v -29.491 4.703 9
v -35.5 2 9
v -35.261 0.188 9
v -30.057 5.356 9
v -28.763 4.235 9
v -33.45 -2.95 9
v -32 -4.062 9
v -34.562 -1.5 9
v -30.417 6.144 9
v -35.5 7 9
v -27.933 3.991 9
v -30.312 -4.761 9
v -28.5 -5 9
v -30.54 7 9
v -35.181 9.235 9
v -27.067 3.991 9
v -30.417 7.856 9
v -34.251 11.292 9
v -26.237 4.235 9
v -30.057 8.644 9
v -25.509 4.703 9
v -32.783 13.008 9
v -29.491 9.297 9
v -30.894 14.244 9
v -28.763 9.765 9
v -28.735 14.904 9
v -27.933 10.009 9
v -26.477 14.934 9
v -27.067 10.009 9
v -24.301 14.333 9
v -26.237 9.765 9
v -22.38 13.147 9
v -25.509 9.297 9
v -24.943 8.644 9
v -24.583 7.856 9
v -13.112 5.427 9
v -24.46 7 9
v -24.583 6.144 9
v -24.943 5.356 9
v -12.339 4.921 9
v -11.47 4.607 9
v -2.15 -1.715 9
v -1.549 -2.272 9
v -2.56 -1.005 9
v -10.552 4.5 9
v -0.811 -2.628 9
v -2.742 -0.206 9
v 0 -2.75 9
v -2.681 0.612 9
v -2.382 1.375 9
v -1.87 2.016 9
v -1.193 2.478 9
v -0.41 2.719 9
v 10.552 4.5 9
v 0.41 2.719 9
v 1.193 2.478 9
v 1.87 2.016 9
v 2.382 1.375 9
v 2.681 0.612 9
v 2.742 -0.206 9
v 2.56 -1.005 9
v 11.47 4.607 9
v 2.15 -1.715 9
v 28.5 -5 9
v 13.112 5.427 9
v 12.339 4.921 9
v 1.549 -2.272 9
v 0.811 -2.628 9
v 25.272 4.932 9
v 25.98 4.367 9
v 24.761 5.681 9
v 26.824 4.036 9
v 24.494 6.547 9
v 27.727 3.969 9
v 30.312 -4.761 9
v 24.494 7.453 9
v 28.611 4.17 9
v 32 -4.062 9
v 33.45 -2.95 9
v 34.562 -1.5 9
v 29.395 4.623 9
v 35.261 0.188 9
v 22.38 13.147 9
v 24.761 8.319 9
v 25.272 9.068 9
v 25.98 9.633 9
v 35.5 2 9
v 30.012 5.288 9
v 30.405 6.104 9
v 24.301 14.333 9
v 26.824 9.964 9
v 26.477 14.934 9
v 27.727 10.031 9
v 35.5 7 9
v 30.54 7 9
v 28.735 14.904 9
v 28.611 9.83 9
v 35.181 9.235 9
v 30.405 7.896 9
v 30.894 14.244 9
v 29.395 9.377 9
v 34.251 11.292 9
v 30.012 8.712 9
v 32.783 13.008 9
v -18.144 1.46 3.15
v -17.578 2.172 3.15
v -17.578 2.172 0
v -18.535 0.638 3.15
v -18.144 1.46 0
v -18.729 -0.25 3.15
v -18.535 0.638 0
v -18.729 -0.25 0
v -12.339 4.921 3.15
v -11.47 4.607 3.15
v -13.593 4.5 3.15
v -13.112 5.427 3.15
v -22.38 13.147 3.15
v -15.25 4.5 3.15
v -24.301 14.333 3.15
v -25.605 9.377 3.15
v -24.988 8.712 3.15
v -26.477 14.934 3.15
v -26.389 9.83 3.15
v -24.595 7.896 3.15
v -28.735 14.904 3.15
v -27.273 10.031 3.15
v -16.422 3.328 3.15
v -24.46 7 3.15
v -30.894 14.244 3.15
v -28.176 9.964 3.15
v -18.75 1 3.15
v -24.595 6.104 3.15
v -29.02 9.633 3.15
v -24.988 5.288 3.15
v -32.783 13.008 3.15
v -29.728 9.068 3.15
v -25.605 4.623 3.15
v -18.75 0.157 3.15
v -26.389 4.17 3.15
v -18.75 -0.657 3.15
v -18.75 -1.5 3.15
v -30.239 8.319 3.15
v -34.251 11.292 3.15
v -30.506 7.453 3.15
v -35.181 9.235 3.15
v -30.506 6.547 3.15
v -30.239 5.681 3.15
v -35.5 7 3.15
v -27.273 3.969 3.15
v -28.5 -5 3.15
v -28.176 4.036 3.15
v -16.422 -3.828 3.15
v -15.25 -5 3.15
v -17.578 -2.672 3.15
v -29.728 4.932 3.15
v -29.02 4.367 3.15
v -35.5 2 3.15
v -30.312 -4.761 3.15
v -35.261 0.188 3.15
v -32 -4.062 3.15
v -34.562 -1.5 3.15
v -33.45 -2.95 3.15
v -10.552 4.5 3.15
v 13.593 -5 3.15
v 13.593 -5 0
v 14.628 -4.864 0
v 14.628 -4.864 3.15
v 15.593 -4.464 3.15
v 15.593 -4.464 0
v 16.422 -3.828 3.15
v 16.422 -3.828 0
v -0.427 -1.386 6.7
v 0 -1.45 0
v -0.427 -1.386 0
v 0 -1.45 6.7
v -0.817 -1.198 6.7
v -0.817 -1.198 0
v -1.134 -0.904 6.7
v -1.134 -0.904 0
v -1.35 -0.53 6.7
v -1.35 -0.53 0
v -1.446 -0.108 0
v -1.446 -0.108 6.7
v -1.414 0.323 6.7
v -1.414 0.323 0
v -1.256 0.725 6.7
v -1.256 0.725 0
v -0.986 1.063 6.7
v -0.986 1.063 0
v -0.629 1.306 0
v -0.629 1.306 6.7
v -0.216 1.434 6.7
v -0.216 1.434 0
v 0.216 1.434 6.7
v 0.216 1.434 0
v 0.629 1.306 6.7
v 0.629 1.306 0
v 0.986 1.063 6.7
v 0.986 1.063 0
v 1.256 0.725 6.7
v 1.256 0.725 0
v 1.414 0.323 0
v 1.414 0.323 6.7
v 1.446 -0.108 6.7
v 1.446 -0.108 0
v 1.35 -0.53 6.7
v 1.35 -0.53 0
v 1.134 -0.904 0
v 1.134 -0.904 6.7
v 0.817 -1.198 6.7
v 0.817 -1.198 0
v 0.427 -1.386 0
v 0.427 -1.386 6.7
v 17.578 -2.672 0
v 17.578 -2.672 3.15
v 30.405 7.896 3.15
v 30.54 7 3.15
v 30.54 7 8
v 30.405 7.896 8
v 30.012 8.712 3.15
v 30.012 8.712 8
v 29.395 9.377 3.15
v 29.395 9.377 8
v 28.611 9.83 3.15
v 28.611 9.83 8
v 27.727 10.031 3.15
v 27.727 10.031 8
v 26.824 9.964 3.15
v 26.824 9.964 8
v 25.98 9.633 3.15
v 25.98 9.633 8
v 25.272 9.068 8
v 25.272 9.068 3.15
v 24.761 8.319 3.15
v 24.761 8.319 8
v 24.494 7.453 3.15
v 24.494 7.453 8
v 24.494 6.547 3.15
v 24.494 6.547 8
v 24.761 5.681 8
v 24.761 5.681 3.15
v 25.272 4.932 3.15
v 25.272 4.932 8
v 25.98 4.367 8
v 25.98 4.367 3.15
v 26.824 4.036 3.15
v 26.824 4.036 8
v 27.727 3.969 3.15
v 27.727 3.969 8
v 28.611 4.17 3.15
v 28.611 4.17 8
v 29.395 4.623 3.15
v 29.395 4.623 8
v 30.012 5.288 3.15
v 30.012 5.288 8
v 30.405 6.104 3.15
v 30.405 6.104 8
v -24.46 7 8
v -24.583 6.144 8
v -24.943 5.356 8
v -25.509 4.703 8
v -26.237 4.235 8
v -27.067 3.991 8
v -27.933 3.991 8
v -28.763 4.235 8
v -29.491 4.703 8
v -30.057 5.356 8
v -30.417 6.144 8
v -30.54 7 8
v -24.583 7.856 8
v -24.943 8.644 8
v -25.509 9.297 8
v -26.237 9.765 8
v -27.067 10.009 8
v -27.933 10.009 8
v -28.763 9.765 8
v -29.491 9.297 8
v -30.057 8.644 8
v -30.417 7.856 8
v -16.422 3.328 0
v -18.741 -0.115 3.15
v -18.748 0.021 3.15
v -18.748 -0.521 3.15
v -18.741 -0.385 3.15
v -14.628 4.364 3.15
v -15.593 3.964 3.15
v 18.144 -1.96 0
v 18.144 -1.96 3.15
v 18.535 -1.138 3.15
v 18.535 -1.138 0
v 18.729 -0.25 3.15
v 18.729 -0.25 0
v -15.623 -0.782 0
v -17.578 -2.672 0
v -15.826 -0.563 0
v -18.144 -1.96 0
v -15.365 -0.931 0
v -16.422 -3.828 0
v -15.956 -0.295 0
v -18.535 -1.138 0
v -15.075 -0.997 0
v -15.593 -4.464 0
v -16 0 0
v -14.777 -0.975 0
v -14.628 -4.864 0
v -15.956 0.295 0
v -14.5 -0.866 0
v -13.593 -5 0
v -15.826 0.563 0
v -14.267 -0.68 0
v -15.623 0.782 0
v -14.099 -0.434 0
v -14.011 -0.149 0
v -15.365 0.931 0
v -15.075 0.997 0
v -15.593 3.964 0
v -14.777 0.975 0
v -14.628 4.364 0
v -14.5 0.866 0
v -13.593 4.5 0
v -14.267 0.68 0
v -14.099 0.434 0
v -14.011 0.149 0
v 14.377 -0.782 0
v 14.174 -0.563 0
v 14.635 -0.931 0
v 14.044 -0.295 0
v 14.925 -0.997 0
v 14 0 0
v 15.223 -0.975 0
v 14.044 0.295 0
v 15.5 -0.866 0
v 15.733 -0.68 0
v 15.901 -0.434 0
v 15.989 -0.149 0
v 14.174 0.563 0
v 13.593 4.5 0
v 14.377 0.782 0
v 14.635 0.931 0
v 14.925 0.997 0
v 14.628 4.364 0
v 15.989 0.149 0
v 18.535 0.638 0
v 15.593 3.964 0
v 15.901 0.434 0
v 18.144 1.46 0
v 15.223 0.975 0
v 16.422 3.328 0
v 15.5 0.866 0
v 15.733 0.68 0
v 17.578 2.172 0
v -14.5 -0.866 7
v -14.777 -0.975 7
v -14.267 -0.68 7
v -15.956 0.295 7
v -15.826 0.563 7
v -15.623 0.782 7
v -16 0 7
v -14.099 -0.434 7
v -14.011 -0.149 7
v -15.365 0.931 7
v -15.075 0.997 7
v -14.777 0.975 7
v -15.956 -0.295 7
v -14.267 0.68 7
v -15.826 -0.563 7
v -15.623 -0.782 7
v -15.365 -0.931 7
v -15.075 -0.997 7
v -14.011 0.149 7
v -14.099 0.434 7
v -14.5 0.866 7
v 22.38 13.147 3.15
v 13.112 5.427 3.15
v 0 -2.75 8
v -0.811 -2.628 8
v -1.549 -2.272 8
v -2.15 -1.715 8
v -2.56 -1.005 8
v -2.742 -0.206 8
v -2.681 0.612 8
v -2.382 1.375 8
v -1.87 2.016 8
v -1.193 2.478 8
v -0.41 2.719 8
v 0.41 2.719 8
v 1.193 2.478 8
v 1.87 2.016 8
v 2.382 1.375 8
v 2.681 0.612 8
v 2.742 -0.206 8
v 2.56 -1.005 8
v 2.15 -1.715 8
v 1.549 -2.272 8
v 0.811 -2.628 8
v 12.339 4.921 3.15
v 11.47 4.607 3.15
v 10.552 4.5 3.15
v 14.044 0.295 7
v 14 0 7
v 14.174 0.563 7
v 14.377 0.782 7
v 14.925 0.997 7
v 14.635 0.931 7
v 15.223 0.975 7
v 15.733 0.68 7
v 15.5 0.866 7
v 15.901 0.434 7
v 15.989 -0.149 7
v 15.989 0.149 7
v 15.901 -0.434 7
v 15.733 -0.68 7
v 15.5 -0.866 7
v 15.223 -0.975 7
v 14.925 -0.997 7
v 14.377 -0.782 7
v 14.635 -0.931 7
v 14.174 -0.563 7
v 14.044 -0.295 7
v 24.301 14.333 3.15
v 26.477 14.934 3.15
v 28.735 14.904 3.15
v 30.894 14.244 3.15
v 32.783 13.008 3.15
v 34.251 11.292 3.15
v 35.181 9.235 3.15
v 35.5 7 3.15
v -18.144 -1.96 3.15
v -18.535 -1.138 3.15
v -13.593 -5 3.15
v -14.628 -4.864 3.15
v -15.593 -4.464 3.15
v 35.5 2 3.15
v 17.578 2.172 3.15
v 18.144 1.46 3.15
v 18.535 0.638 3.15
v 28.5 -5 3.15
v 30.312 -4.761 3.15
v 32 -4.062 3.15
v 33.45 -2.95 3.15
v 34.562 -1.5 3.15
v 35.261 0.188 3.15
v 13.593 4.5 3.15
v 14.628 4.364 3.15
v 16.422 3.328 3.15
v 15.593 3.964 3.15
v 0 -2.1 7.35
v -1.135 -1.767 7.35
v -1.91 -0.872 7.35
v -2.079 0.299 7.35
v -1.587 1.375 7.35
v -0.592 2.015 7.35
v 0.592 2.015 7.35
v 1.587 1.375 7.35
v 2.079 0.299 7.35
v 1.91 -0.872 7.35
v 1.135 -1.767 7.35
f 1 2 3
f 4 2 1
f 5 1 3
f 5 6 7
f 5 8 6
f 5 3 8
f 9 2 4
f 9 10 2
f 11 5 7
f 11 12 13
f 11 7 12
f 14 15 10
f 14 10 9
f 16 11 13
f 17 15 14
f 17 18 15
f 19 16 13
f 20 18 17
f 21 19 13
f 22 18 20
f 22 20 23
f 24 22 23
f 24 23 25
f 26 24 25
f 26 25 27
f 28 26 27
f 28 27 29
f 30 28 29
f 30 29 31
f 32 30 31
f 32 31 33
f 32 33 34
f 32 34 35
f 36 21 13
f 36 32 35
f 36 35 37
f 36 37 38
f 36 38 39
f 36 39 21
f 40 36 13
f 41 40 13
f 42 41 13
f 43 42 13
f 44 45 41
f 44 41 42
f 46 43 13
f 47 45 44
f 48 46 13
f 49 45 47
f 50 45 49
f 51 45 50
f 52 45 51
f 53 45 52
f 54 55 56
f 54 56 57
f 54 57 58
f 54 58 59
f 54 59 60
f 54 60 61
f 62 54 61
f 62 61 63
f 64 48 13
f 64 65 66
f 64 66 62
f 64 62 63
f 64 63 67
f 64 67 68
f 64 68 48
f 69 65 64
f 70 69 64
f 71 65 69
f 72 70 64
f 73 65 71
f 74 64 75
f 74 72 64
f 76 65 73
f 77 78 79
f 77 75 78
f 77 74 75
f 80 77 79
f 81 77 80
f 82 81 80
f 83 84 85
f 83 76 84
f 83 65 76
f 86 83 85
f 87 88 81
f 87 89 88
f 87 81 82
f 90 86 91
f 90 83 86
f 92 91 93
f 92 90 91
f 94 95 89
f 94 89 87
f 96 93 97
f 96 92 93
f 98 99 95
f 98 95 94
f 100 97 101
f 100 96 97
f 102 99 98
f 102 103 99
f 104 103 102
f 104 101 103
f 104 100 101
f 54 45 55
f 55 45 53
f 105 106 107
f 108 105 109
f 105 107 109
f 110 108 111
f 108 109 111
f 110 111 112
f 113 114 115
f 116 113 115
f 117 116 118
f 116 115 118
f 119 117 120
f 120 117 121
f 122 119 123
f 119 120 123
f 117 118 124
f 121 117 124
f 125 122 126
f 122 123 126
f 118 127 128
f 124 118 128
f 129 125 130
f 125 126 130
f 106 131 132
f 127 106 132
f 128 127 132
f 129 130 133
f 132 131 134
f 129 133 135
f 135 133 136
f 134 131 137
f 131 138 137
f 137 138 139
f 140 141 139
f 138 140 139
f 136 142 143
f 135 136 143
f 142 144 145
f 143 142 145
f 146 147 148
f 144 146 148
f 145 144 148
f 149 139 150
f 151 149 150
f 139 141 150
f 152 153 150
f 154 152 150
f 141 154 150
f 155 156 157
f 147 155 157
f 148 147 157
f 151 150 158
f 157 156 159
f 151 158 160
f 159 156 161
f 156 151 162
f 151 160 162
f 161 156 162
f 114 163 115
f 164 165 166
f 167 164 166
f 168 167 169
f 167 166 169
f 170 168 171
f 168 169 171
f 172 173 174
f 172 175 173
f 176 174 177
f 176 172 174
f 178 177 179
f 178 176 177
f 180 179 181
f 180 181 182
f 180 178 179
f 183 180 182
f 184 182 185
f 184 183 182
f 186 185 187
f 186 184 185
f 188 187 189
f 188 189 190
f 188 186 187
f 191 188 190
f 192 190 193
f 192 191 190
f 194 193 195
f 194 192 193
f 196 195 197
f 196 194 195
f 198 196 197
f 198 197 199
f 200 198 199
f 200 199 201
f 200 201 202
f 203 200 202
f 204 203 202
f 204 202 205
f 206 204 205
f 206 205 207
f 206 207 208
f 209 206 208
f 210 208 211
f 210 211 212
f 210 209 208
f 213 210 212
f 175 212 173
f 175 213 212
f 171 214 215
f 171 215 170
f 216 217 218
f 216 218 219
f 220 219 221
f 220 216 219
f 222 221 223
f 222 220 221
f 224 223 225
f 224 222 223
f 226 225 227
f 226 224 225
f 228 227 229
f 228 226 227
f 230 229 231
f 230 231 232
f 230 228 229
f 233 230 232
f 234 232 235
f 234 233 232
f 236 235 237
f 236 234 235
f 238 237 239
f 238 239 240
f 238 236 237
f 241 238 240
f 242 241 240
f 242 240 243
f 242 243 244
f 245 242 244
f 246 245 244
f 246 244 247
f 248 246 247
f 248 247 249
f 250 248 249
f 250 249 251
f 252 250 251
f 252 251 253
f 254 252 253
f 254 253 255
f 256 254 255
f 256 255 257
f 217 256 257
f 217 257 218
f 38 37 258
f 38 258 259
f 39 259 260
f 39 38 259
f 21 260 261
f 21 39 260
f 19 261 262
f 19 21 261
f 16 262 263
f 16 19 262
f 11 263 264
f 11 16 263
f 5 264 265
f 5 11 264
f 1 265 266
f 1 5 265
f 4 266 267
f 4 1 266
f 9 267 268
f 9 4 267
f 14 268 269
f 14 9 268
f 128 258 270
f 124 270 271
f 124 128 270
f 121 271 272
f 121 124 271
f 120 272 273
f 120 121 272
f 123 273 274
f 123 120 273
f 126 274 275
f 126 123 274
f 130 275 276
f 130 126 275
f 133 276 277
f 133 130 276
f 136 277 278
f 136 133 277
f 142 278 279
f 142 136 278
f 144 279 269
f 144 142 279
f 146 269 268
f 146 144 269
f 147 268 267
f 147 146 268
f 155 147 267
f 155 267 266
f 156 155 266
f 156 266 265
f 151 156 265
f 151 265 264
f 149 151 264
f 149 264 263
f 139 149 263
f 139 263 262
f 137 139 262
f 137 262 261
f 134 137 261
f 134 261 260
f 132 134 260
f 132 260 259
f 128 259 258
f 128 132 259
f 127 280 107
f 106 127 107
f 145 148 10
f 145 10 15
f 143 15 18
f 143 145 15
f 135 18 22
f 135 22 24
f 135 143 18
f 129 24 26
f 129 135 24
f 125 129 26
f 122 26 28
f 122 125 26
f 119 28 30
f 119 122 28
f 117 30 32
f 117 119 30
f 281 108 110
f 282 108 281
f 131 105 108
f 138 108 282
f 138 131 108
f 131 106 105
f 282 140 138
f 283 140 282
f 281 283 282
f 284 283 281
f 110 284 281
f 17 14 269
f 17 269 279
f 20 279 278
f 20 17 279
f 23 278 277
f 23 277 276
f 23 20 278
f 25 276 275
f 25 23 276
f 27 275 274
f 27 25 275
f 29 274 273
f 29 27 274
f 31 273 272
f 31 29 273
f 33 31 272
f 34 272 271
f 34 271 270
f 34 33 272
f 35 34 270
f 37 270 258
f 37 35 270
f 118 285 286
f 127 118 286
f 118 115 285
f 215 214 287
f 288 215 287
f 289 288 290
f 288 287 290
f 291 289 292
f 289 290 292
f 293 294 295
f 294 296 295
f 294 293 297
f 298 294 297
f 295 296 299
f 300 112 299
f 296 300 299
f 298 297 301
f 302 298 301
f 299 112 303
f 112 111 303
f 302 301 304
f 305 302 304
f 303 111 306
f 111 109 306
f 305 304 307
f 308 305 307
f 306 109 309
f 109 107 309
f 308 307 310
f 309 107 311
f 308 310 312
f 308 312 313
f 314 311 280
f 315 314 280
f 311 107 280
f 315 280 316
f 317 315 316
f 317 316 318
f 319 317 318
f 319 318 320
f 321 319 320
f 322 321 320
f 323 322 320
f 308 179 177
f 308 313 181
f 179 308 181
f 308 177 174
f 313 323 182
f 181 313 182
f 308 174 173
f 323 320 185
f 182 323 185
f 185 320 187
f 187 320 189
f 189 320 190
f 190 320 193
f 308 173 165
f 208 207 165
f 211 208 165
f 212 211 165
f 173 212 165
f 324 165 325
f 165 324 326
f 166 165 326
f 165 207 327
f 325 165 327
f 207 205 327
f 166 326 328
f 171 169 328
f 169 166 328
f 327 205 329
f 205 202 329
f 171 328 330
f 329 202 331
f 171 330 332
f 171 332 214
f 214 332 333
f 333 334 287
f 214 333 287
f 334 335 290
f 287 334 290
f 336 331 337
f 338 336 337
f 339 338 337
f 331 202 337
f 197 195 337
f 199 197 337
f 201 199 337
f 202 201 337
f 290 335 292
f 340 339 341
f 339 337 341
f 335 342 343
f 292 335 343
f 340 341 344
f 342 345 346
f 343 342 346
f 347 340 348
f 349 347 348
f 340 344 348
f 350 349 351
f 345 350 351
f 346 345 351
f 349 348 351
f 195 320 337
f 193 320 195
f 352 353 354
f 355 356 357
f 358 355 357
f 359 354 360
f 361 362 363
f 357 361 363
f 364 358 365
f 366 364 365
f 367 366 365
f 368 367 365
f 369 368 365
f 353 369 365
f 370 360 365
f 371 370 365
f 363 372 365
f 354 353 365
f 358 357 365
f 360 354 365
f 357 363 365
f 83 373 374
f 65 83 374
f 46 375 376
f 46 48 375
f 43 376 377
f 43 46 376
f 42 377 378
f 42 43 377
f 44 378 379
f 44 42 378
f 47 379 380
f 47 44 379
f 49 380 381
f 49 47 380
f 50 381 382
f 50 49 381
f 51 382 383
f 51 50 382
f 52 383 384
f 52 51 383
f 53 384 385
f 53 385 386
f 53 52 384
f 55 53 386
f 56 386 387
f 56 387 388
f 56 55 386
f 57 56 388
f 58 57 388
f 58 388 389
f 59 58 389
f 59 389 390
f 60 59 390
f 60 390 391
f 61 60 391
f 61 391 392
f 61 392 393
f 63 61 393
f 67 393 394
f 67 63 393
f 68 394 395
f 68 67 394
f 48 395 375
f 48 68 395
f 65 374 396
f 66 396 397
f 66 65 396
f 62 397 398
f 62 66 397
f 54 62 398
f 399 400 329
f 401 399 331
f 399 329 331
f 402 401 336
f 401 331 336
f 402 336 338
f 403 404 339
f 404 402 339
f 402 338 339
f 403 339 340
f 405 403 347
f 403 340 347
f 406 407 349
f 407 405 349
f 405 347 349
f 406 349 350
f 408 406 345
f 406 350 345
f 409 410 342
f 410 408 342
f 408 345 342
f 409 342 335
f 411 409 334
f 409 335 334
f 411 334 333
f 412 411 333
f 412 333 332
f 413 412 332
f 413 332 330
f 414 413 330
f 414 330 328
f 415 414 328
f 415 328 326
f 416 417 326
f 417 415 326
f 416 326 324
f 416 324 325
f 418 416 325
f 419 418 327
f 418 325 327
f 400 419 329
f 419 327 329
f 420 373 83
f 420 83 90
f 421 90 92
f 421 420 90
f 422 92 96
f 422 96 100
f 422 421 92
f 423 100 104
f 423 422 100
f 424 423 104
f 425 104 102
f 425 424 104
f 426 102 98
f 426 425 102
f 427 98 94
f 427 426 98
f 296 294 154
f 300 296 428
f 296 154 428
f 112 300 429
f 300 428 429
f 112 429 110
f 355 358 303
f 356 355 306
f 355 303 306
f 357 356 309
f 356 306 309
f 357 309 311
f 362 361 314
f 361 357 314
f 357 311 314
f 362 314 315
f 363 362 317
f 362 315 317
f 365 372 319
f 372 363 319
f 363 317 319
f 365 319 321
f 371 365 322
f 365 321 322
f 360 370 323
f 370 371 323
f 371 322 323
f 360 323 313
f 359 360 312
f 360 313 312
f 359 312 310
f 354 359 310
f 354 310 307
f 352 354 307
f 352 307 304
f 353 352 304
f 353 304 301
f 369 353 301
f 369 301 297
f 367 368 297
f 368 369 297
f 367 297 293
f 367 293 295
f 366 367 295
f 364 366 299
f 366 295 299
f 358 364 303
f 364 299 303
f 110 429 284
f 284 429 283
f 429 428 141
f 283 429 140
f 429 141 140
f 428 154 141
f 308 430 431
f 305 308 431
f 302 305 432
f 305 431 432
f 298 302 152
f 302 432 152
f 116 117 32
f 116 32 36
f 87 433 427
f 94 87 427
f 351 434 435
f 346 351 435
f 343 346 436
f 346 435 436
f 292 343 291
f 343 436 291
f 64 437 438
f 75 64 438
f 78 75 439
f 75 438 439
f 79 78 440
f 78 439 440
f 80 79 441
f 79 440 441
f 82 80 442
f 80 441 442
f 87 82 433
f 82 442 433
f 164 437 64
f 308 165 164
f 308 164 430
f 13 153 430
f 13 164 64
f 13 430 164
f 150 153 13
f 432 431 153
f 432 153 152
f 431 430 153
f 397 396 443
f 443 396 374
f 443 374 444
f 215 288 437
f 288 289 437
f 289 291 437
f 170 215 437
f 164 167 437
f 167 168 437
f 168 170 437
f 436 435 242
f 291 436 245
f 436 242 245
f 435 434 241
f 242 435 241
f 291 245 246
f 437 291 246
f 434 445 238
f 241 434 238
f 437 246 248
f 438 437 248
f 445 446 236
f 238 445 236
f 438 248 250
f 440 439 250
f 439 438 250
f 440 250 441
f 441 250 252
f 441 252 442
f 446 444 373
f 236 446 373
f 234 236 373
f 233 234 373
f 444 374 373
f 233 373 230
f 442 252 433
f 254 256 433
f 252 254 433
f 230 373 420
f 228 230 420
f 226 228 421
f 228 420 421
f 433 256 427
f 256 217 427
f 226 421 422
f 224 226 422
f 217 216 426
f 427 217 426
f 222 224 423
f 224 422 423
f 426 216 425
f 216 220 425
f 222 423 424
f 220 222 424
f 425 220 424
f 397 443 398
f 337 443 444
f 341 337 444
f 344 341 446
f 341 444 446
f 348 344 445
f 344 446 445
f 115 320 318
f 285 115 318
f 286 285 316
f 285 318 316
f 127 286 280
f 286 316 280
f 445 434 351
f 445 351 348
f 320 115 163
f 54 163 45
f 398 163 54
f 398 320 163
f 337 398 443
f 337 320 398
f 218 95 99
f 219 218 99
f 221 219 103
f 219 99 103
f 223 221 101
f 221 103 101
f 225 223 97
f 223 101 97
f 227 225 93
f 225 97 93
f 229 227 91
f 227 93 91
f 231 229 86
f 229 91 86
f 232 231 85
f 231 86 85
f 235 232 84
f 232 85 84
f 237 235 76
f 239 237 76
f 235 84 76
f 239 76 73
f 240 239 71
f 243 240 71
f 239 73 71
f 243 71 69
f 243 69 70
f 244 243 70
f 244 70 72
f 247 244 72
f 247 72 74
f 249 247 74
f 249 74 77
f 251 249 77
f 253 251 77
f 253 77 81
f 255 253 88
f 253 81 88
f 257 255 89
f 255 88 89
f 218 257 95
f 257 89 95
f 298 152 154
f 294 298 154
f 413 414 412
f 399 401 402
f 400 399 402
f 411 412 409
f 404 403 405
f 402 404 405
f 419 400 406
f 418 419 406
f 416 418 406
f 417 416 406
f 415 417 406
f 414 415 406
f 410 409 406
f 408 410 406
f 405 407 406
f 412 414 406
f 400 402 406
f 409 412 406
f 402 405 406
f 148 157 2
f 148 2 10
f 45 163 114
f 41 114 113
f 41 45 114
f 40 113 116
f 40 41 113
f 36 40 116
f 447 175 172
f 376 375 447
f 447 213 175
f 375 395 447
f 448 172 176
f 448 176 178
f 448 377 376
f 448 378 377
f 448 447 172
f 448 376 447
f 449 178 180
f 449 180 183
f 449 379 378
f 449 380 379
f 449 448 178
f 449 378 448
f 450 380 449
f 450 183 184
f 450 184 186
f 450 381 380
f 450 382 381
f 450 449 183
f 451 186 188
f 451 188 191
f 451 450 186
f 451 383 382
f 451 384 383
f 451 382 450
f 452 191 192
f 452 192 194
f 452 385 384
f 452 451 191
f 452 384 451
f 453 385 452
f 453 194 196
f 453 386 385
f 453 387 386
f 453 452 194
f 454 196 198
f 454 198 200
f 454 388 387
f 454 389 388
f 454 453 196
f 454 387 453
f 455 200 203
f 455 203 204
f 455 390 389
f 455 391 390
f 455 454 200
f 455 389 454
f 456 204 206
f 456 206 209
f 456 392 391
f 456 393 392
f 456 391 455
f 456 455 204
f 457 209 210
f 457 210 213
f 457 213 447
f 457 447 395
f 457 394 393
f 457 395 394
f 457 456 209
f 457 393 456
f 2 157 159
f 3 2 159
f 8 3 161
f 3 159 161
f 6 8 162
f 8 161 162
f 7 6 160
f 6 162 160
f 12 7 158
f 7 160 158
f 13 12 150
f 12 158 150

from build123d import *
from build123d.topology import SkipClean

# Parameters (mm, degrees)
BOSS_EXTRUDE1_DEPTH          = 9
BOSS_EXTRUDE1_DEPTH_BACK     = 9
SKETCH1_W                    = 67.5
SKETCH1_H                    = 7
SKETCH2_W                    = 15
SKETCH2_H                    = 6.3
CUT_EXTRUDE1_DEPTH           = 36.623903492
SKETCH3_W                    = 12.5
SKETCH3_H                    = 5.85
BOSS_EXTRUDE2_DEPTH          = 10
CUT_EXTRUDE2_DEPTH           = 22
CUT_EXTRUDE2_DEPTH_BACK      = 24.5
SKETCH4_R                    = 3.04
CUT_EXTRUDE3_DEPTH           = 5
SKETCH6_R                    = 6.2
CUT_EXTRUDE4_DEPTH           = 1
MIRROR2_COPY_1_SKETCH_R      = 6.2
MIRROR2_COPY_1_DEPTH         = 1
SKETCH7_W                    = 12.5
SKETCH7_H                    = 8.5
CUT_EXTRUDE5_DEPTH           = 1
MIRROR5_COPY_1_SKETCH_W      = 12.5
MIRROR5_COPY_1_SKETCH_H      = 8.5
MIRROR5_COPY_1_DEPTH         = 1
TAP_DRILL_FOR_M2_TAP1_D      = 1.6
CUT_EXTRUDE6_DEPTH           = 27
SKETCH12_W                   = 73.606041854
SKETCH12_H                   = 30.436261762
CUT_EXTRUDE7_DEPTH           = 22
F_2_0_2_DIAMETER_HOLE1_D     = 2
F_2_0_2_DIAMETER_HOLE1_DEPTH = 30.5
F_2_0_2_DIAMETER_HOLE2_D     = 2
F_2_0_2_DIAMETER_HOLE2_DEPTH = 16
F_2_0_2_DIAMETER_HOLE2_TIP   = 0.600860619
BOSS_EXTRU_1_START           = 1
ESQUISSE2_R                  = 3.04
BOSS_EXTRU_1_DEPTH           = 1
BOSS_EXTRU_3_START           = -5.85
ESQUISSE5_R                  = 0.8
BOSS_EXTRU_3_DEPTH           = 5.85
BOSS_EXTRU_4_START           = -9
ESQUISSE6_R                  = 0.8
BOSS_EXTRU_4_DEPTH           = 9
BOSS_EXTRUDE3_DEPTH          = 1.5
BOSS_EXTRUDE4_DEPTH          = 1
BOSS_EXTRUDE5_DEPTH          = 5.85
CHAMFER1_SIZE                = 3.5
BOSS_EXTRUDE6_START          = -2
SKETCH27_R                   = 1
BOSS_EXTRUDE6_DEPTH          = 2
SKETCH28_R                   = 8
SKETCH28_R_2                 = 3.04
BOSS_EXTRUDE7_DEPTH          = 5.85
SKETCH29_W                   = 1.75
SKETCH29_H                   = 12
BOSS_EXTRUDE8_DEPTH          = 5.85
BOSS_EXTRUDE9_DEPTH          = 5.85
FILLET1_R                    = 4
FILLET2_R                    = 7
FILLET4_R                    = 4


with BuildPart() as part:
    # Sketch1 → Boss-Extrude1 (new, two sides: drawn at the far end of the back side and taken through both)
    with BuildSketch(Plane.XY.offset(-BOSS_EXTRUDE1_DEPTH_BACK)):
        Rectangle(SKETCH1_W, SKETCH1_H)
    extrude(amount=BOSS_EXTRUDE1_DEPTH + BOSS_EXTRUDE1_DEPTH_BACK)

    # Sketch2 → Cut-Extrude1 (cut, through all)
    with BuildSketch(Plane(origin=(0, 3.5, 0), x_dir=(1, 0, 0), z_dir=(0, 1, 0))):
        with Locations((-26.25, 0)):
            Rectangle(SKETCH2_W, SKETCH2_H)
        with Locations((26.25, 0)):
            Rectangle(SKETCH2_W, SKETCH2_H)
    extrude(amount=-CUT_EXTRUDE1_DEPTH, mode=Mode.SUBTRACT)

    # Sketch3 → Boss-Extrude2 (add)
    with BuildSketch(Plane(origin=(0, 3.5, 0), x_dir=(1, 0, 0), z_dir=(0, 1, 0))):
        with Locations((-27.5, 6.075)):
            Rectangle(SKETCH3_W, SKETCH3_H)
        with Locations((-27.5, -6.075)):
            Rectangle(SKETCH3_W, SKETCH3_H)
        with Locations((27.5, -6.075)):
            Rectangle(SKETCH3_W, SKETCH3_H)
        with Locations((27.5, 6.075)):
            Rectangle(SKETCH3_W, SKETCH3_H)
    extrude(amount=BOSS_EXTRUDE2_DEPTH)

    # Sketch4 → Cut-Extrude2 (cut, two sides: drawn at the far end of the back side and taken through both)
    with BuildSketch(Plane.XY.offset(-CUT_EXTRUDE2_DEPTH_BACK)):
        with Locations((-27.5, 7)):
            Circle(SKETCH4_R)
        with Locations((27.5, 7)):
            Circle(SKETCH4_R)
    extrude(amount=CUT_EXTRUDE2_DEPTH + CUT_EXTRUDE2_DEPTH_BACK, mode=Mode.SUBTRACT)

    # Sketch5 → Cut-Extrude3 (cut)
    with BuildSketch(Plane.XY):
        Polygon((15, 3.5), (36.256888292, -2.195766051), (36.256888292, 13.5), (15, 13.5), align=None)
    extrude(amount=-CUT_EXTRUDE3_DEPTH, mode=Mode.SUBTRACT)

    # Sketch6 → Cut-Extrude4 (cut)
    with BuildSketch(Plane.XY.offset(9)):
        with Locations((27.5, 7)):
            Circle(SKETCH6_R)
    cut_extrude4 = extrude(amount=-CUT_EXTRUDE4_DEPTH, mode=Mode.SUBTRACT)

    # Mirror1: Cut-Extrude4 across plane
    add(cut_extrude4.mirror(Plane.XY), mode=Mode.SUBTRACT)

    # Mirror2: Cut-Extrude4 across plane
    add(cut_extrude4.mirror(Plane(origin=(0, 0, 0), x_dir=(0, 0, 1), z_dir=(1, 0, 0))), mode=Mode.SUBTRACT)

    # Mirror2 copy 1 sketch → Mirror2 copy 1 (cut)
    with BuildSketch(Plane(origin=(0, 0, -9), x_dir=(-1, 0, 0), z_dir=(0, 0, -1))):
        with Locations((27.5, 7)):
            Circle(MIRROR2_COPY_1_SKETCH_R)
    extrude(amount=-MIRROR2_COPY_1_DEPTH, mode=Mode.SUBTRACT)

    # Sketch7 → Cut-Extrude5 (cut)
    with BuildSketch(Plane.XY.offset(9)):
        with Locations((-27.5, 9.25)):
            Rectangle(SKETCH7_W, SKETCH7_H)
    cut_extrude5 = extrude(amount=-CUT_EXTRUDE5_DEPTH, mode=Mode.SUBTRACT)

    # Mirror3: Cut-Extrude5 across plane
    add(cut_extrude5.mirror(Plane(origin=(0, 0, 0), x_dir=(0, 0, 1), z_dir=(1, 0, 0))), mode=Mode.SUBTRACT)

    # Mirror5: Cut-Extrude5 across plane
    add(cut_extrude5.mirror(Plane.XY), mode=Mode.SUBTRACT)

    # Mirror5 copy 1 sketch → Mirror5 copy 1 (cut)
    with BuildSketch(Plane(origin=(0, 0, -9), x_dir=(-1, 0, 0), z_dir=(0, 0, -1))):
        with Locations((-27.5, 9.25)):
            Rectangle(MIRROR5_COPY_1_SKETCH_W, MIRROR5_COPY_1_SKETCH_H)
    extrude(amount=-MIRROR5_COPY_1_DEPTH, mode=Mode.SUBTRACT)

    # Tap Drill for M2 Tap1 (through all)
    with Locations(Plane.XY.offset(9)):
        with Locations((-25, 0), (0, 0), (25, 0)):
            Hole(TAP_DRILL_FOR_M2_TAP1_D / 2)

    # Sketch11 → Cut-Extrude6 (cut)
    with BuildSketch(Plane.XY.offset(9)):
        with BuildLine():
            Line((-33.75, 6.999999588), (-33.75, 21.221242017))
            Line((-33.75, 21.221242017), (-21.25, 21.221242017))
            Line((-21.25, 21.221242017), (-21.25, 6.999999588))
            ThreePointArc((-21.25, 6.999999588), (-27.5, 13.25), (-33.75, 6.999999588))
        make_face()
    cut_extrude6 = extrude(amount=-CUT_EXTRUDE6_DEPTH, mode=Mode.SUBTRACT)

    # Mirror6: Cut-Extrude6 across plane
    add(cut_extrude6.mirror(Plane(origin=(0, 0, 0), x_dir=(0, 0, 1), z_dir=(1, 0, 0))), mode=Mode.SUBTRACT)

    # Sketch12 → Cut-Extrude7 (cut)
    with BuildSketch(Plane.XY):
        Rectangle(SKETCH12_W, SKETCH12_H)
    extrude(amount=-CUT_EXTRUDE7_DEPTH, mode=Mode.SUBTRACT)

    # Ø2.0 (2) Diameter Hole1
    with Locations(Plane.XY.offset(9)):
        with Locations((-15, 0)):
            Hole(F_2_0_2_DIAMETER_HOLE1_D / 2, depth=F_2_0_2_DIAMETER_HOLE1_DEPTH)

    # Ø2.0 (2) Diameter Hole2
    with Locations(Plane.XY.offset(9)):
        with Locations((15, 0)):
            Hole(F_2_0_2_DIAMETER_HOLE2_D / 2, depth=F_2_0_2_DIAMETER_HOLE2_DEPTH)
            with Locations((0, 0, -(F_2_0_2_DIAMETER_HOLE2_DEPTH + F_2_0_2_DIAMETER_HOLE2_TIP / 2))):  # 118° drill point
                Cone(0, F_2_0_2_DIAMETER_HOLE2_D / 2, F_2_0_2_DIAMETER_HOLE2_TIP, mode=Mode.SUBTRACT)

    # Esquisse2 → Boss.-Extru.1 (add)
    # profile 1 of 2: a face of its own
    with SkipClean():  # the faces are left unmerged after this step: merging them gives an invalid solid
        with BuildSketch(Plane.XY.offset(8).offset(BOSS_EXTRU_1_START)):
            with BuildLine():
                ThreePointArc((21.6314397, 5), (26.48636147, 13.116578858), (33.7, 7))
                ThreePointArc((33.7, 7), (33.616578858, 5.98636147), (33.3685603, 5))
                Line((33.3685603, 5), (33.75, 5))
                Line((33.75, 5), (33.75, 6.999999588))
                ThreePointArc((33.75, 6.999999588), (27.5, 13.25), (21.25, 6.999999588))
                Line((21.25, 6.999999588), (21.25, 5))
                Line((21.25, 5), (21.6314397, 5))
            make_face()
        # profile 2 of 2: a face of its own
        with BuildSketch(Plane.XY.offset(8).offset(BOSS_EXTRU_1_START)):
            with BuildLine():
                ThreePointArc((33.3685603, 5), (33.616578858, 5.98636147), (33.7, 7))
                ThreePointArc((33.7, 7), (26.48636147, 13.116578858), (21.6314397, 5))
                ThreePointArc((21.6314397, 5), (27.5, 0.8), (33.3685603, 5))
            make_face()
            with Locations((27.5, 7)):
                Circle(ESQUISSE2_R, mode=Mode.SUBTRACT)
        boss_extru_1 = extrude(amount=-BOSS_EXTRU_1_DEPTH)

    # Symétrie1: Boss.-Extru.1 across plane
    with SkipClean():  # the faces are left unmerged after this step: merging them gives an invalid solid
        add(boss_extru_1.mirror(Plane(origin=(0, 0, 0), x_dir=(0, 0, 1), z_dir=(1, 0, 0))))

    # Esquisse5 → Boss.-Extru.3 (add)
    with SkipClean():  # the faces are left unmerged after this step: merging them gives an invalid solid
        with BuildSketch(Plane.XY.offset(9).offset(BOSS_EXTRU_3_START)):
            with Locations((-25, 0)):
                Circle(ESQUISSE5_R)
            with Locations((25, 0)):
                Circle(ESQUISSE5_R)
        extrude(amount=BOSS_EXTRU_3_DEPTH)

    # Esquisse6 → Boss.-Extru.4 (add)
    with SkipClean():  # the faces are left unmerged after this step: merging them gives an invalid solid
        with BuildSketch(Plane.XY.offset(9).offset(BOSS_EXTRU_4_START)):
            Circle(ESQUISSE6_R)
        extrude(amount=BOSS_EXTRU_4_DEPTH)

    # Sketch22 → Boss-Extrude3 (add)
    with SkipClean():  # the faces are left unmerged after this step: merging them gives an invalid solid
        with BuildSketch(Plane.XZ.offset(3.5)):
            Polygon((-18.75, 0), (18.75, 0), (18.75, 3.15), (33.75, 3.15), (33.75, 9), (-33.75, 9), (-33.75, 3.15), (-18.75, 3.15), align=None)
        extrude(amount=BOSS_EXTRUDE3_DEPTH)

    # Sketch23 → CSK for M2.5 Countersunk Flat Head Screw1 (revolve, cut)
    with SkipClean():  # the faces are left unmerged after this step: merging them gives an invalid solid
        with BuildSketch(Plane(origin=(0, 0, 9), x_dir=(0, -1, 0), z_dir=(1, 0, 0))):
            Polygon((0, 0), (0, 9), (1.45, 9), (1.45, 2.3), (2.75, 1), (2.75, 0), align=None)
        revolve(axis=Axis((0, 0, 15.35), (0, 0, -1)), mode=Mode.SUBTRACT)

    # Sketch25 → Boss-Extrude4 (add)
    with SkipClean():  # the faces are left unmerged after this step: merging them gives an invalid solid
        with BuildSketch(Plane(origin=(0, 3.5, 0), x_dir=(1, 0, 0), z_dir=(0, 1, 0))):
            Polygon((18.75, 0), (-18.75, 0), (-18.75, -3.15), (-21.25, -3.15), (-21.25, -9), (21.25, -9), (21.25, -3.15), (18.75, -3.15), align=None)
        extrude(amount=BOSS_EXTRUDE4_DEPTH)

    # Sketch26 → Boss-Extrude5 (add)
    with SkipClean():  # the faces are left unmerged after this step: merging them gives an invalid solid
        with BuildSketch(Plane(origin=(0, 0, 3.15), x_dir=(-1, 0, 0), z_dir=(0, 0, -1))):
            Polygon((-24.13078786, 12.264115268), (-12, 4.5), (-21.25, 4.5), align=None)
            Polygon((21.25, 4.5), (24.13078786, 12.264115268), (12, 4.5), align=None)
        extrude(amount=-BOSS_EXTRUDE5_DEPTH)

    # Chamfer1
    # the kernel refuses this chamfer: 3.5 mm, written as the material it takes off along each edge
    with BuildSketch(Plane(origin=(-18.75, -5, 3.15), x_dir=(0.9996219169112968, -0.027495876610586112, 0), z_dir=(0, 0, -1)), Plane(origin=(-18.75, 4.5, -9.000890458), x_dir=(0.9996219169112968, 0.027495876610586372, 0), z_dir=(0, 0, 1))) as chamfer1_piece_1:
        Polygon((CHAMFER1_SIZE * 0.999621916911, -CHAMFER1_SIZE * 0.0274958766106), (-CHAMFER1_SIZE * 0.0274958766106, -CHAMFER1_SIZE * 0.999621916911), (0, 0), align=None)
    extrude(amount=12.150890458, mode=Mode.SUBTRACT)
    with BuildSketch(Plane(origin=(18.75, -5, -9.000890458), x_dir=(0.02749587661058612, 0.9996219169112968, 0), z_dir=(0, 0, 1)), Plane(origin=(18.75, 4.5, 3.15), x_dir=(0.02749587661058612, -0.9996219169112968, 0), z_dir=(0, 0, -1))) as chamfer1_piece_2:
        Polygon((CHAMFER1_SIZE * 0.999621916911, CHAMFER1_SIZE * 0.0274958766106), (-CHAMFER1_SIZE * 0.0274958766106, CHAMFER1_SIZE * 0.999621916911), (0, 0), align=None)
    extrude(amount=12.150890458, mode=Mode.SUBTRACT)

    # Sketch27 → Boss-Extrude6 (add)
    with BuildSketch(Plane.XY.offset(9).offset(BOSS_EXTRUDE6_START)):
        with Locations((-15, 0)):
            Circle(SKETCH27_R)
        with Locations((15, 0)):
            Circle(SKETCH27_R)
    extrude(amount=BOSS_EXTRUDE6_DEPTH)

    # Sketch28 → Boss-Extrude7 (add)
    # profile 1 of 2: a face of its own
    with BuildSketch(Plane(origin=(0, 0, 3.15), x_dir=(-1, 0, 0), z_dir=(0, 0, -1))):
        with Locations((-27.5, 7)):
            Circle(SKETCH28_R)
        with Locations(Location((-27.5, 7, 0), (0, 0, 180))):
            Circle(SKETCH28_R_2, mode=Mode.SUBTRACT)
    # profile 2 of 2: a face of its own
    with BuildSketch(Plane(origin=(0, 0, 3.15), x_dir=(-1, 0, 0), z_dir=(0, 0, -1))):
        with Locations((27.5, 7)):
            Circle(SKETCH28_R)
        with Locations(Location((27.5, 7, 0), (0, 0, 180))):
            Circle(SKETCH28_R_2, mode=Mode.SUBTRACT)
    extrude(amount=-BOSS_EXTRUDE7_DEPTH)

    # Sketch29 → Boss-Extrude8 (add)
    with BuildSketch(Plane(origin=(0, 0, 3.15), x_dir=(-1, 0, 0), z_dir=(0, 0, -1))):
        with Locations((-34.625, 1)):
            Rectangle(SKETCH29_W, SKETCH29_H)
        with Locations((34.625, 1)):
            Rectangle(SKETCH29_W, SKETCH29_H)
    extrude(amount=-BOSS_EXTRUDE8_DEPTH)

    # Sketch31 → Boss-Extrude9 (add)
    with BuildSketch(Plane(origin=(0, 0, 3.15), x_dir=(-1, 0, 0), z_dir=(0, 0, -1))):
        Polygon((-22.379573543, 13.146644035), (-12, 4.5), (-19.924763055, 9.572116877), align=None)
        Polygon((19.924763055, 9.572116877), (22.379573543, 13.146644035), (12, 4.5), align=None)
    extrude(amount=-BOSS_EXTRUDE9_DEPTH)

    # Fillet1
    fillet1_edges = [part.edges().sort_by_distance(p)[0] for p in [
        (12, 4.5, 6.075),
        (-12, 4.5, 6.075),
    ]]
    fillet(fillet1_edges, radius=FILLET1_R)

    # Fillet2
    # the kernel refuses this fillet: 7 mm, written as the material it takes off along each edge
    with BuildSketch(Plane(origin=(35.5, -5, -14.35), x_dir=(0, 1, 0), z_dir=(0, 0, 1))) as fillet2_piece_1:
        with BuildLine():
            CenterArc((FILLET2_R, FILLET2_R), FILLET2_R, 180, 90)
            Line((0, FILLET2_R), (0, 0))
            Line((0, 0), (FILLET2_R, 0))
        make_face()
    extrude(amount=40.85, mode=Mode.SUBTRACT)
    with BuildSketch(Plane(origin=(-35.5, -5, -14.35), x_dir=(0, 1, 0), z_dir=(0, 0, 1))) as fillet2_piece_2:
        with BuildLine():
            CenterArc((FILLET2_R, -FILLET2_R), FILLET2_R, 90, 90)
            Line((0, -FILLET2_R), (0, 0))
            Line((0, 0), (FILLET2_R, 0))
        make_face()
    extrude(amount=40.85, mode=Mode.SUBTRACT)

    # Fillet4
    # the kernel refuses this fillet: 4 mm, written as the material it takes off along each edge
    with BuildSketch(Plane(origin=(-18.75, -1.5, 3.15), x_dir=(0.7071067811862645, -0.7071067811868306, 0), z_dir=(0, 0, -1)), Plane(origin=(-18.75, 1, -4.142135624), x_dir=(0.7071067811862647, 0.7071067811868305, 0), z_dir=(0, 0, 1)), Plane(origin=(-15.25, 4.5, -4.142135624), x_dir=(1, 0, 0), z_dir=(0, 0, 1)), Plane(origin=(-15.25, -5, 3.15), x_dir=(1, 0, 0), z_dir=(0, 0, -1)), Plane(origin=(15.25, -5, -4.142135624), x_dir=(-1, 0, 0), z_dir=(0, 0, 1)), Plane(origin=(18.75, -1.5, -4.142135624), x_dir=(-0.7071067811868305, -0.7071067811862647, 0), z_dir=(0, 0, 1))) as fillet4_piece_1:
        with BuildLine():
            CenterArc((FILLET4_R * 0.414213562373, -FILLET4_R), FILLET4_R, 90, 45)
            Line((-FILLET4_R * 0.292893218813, -FILLET4_R * 0.292893218813), (0, 0))
            Line((0, 0), (FILLET4_R * 0.414213562373, 0))
        make_face()
    extrude(amount=7.292135624, mode=Mode.SUBTRACT)
    with BuildSketch(Plane(origin=(18.75, 1, 3.15), x_dir=(0, -1, 0), z_dir=(0, 0, -1)), Plane(origin=(15.25, 4.5, 3.15), x_dir=(0.7071067811868307, -0.7071067811862646, 0), z_dir=(0, 0, -1))) as fillet4_piece_2:
        with BuildLine():
            CenterArc((FILLET4_R * 0.414213562374, FILLET4_R), FILLET4_R, 225, 45)
            Line((-FILLET4_R * 0.292893218813, FILLET4_R * 0.292893218814), (0, 0))
            Line((0, 0), (FILLET4_R * 0.414213562373, 0))
        make_face()
    extrude(amount=7.292135624, mode=Mode.SUBTRACT)


solid = part.part
